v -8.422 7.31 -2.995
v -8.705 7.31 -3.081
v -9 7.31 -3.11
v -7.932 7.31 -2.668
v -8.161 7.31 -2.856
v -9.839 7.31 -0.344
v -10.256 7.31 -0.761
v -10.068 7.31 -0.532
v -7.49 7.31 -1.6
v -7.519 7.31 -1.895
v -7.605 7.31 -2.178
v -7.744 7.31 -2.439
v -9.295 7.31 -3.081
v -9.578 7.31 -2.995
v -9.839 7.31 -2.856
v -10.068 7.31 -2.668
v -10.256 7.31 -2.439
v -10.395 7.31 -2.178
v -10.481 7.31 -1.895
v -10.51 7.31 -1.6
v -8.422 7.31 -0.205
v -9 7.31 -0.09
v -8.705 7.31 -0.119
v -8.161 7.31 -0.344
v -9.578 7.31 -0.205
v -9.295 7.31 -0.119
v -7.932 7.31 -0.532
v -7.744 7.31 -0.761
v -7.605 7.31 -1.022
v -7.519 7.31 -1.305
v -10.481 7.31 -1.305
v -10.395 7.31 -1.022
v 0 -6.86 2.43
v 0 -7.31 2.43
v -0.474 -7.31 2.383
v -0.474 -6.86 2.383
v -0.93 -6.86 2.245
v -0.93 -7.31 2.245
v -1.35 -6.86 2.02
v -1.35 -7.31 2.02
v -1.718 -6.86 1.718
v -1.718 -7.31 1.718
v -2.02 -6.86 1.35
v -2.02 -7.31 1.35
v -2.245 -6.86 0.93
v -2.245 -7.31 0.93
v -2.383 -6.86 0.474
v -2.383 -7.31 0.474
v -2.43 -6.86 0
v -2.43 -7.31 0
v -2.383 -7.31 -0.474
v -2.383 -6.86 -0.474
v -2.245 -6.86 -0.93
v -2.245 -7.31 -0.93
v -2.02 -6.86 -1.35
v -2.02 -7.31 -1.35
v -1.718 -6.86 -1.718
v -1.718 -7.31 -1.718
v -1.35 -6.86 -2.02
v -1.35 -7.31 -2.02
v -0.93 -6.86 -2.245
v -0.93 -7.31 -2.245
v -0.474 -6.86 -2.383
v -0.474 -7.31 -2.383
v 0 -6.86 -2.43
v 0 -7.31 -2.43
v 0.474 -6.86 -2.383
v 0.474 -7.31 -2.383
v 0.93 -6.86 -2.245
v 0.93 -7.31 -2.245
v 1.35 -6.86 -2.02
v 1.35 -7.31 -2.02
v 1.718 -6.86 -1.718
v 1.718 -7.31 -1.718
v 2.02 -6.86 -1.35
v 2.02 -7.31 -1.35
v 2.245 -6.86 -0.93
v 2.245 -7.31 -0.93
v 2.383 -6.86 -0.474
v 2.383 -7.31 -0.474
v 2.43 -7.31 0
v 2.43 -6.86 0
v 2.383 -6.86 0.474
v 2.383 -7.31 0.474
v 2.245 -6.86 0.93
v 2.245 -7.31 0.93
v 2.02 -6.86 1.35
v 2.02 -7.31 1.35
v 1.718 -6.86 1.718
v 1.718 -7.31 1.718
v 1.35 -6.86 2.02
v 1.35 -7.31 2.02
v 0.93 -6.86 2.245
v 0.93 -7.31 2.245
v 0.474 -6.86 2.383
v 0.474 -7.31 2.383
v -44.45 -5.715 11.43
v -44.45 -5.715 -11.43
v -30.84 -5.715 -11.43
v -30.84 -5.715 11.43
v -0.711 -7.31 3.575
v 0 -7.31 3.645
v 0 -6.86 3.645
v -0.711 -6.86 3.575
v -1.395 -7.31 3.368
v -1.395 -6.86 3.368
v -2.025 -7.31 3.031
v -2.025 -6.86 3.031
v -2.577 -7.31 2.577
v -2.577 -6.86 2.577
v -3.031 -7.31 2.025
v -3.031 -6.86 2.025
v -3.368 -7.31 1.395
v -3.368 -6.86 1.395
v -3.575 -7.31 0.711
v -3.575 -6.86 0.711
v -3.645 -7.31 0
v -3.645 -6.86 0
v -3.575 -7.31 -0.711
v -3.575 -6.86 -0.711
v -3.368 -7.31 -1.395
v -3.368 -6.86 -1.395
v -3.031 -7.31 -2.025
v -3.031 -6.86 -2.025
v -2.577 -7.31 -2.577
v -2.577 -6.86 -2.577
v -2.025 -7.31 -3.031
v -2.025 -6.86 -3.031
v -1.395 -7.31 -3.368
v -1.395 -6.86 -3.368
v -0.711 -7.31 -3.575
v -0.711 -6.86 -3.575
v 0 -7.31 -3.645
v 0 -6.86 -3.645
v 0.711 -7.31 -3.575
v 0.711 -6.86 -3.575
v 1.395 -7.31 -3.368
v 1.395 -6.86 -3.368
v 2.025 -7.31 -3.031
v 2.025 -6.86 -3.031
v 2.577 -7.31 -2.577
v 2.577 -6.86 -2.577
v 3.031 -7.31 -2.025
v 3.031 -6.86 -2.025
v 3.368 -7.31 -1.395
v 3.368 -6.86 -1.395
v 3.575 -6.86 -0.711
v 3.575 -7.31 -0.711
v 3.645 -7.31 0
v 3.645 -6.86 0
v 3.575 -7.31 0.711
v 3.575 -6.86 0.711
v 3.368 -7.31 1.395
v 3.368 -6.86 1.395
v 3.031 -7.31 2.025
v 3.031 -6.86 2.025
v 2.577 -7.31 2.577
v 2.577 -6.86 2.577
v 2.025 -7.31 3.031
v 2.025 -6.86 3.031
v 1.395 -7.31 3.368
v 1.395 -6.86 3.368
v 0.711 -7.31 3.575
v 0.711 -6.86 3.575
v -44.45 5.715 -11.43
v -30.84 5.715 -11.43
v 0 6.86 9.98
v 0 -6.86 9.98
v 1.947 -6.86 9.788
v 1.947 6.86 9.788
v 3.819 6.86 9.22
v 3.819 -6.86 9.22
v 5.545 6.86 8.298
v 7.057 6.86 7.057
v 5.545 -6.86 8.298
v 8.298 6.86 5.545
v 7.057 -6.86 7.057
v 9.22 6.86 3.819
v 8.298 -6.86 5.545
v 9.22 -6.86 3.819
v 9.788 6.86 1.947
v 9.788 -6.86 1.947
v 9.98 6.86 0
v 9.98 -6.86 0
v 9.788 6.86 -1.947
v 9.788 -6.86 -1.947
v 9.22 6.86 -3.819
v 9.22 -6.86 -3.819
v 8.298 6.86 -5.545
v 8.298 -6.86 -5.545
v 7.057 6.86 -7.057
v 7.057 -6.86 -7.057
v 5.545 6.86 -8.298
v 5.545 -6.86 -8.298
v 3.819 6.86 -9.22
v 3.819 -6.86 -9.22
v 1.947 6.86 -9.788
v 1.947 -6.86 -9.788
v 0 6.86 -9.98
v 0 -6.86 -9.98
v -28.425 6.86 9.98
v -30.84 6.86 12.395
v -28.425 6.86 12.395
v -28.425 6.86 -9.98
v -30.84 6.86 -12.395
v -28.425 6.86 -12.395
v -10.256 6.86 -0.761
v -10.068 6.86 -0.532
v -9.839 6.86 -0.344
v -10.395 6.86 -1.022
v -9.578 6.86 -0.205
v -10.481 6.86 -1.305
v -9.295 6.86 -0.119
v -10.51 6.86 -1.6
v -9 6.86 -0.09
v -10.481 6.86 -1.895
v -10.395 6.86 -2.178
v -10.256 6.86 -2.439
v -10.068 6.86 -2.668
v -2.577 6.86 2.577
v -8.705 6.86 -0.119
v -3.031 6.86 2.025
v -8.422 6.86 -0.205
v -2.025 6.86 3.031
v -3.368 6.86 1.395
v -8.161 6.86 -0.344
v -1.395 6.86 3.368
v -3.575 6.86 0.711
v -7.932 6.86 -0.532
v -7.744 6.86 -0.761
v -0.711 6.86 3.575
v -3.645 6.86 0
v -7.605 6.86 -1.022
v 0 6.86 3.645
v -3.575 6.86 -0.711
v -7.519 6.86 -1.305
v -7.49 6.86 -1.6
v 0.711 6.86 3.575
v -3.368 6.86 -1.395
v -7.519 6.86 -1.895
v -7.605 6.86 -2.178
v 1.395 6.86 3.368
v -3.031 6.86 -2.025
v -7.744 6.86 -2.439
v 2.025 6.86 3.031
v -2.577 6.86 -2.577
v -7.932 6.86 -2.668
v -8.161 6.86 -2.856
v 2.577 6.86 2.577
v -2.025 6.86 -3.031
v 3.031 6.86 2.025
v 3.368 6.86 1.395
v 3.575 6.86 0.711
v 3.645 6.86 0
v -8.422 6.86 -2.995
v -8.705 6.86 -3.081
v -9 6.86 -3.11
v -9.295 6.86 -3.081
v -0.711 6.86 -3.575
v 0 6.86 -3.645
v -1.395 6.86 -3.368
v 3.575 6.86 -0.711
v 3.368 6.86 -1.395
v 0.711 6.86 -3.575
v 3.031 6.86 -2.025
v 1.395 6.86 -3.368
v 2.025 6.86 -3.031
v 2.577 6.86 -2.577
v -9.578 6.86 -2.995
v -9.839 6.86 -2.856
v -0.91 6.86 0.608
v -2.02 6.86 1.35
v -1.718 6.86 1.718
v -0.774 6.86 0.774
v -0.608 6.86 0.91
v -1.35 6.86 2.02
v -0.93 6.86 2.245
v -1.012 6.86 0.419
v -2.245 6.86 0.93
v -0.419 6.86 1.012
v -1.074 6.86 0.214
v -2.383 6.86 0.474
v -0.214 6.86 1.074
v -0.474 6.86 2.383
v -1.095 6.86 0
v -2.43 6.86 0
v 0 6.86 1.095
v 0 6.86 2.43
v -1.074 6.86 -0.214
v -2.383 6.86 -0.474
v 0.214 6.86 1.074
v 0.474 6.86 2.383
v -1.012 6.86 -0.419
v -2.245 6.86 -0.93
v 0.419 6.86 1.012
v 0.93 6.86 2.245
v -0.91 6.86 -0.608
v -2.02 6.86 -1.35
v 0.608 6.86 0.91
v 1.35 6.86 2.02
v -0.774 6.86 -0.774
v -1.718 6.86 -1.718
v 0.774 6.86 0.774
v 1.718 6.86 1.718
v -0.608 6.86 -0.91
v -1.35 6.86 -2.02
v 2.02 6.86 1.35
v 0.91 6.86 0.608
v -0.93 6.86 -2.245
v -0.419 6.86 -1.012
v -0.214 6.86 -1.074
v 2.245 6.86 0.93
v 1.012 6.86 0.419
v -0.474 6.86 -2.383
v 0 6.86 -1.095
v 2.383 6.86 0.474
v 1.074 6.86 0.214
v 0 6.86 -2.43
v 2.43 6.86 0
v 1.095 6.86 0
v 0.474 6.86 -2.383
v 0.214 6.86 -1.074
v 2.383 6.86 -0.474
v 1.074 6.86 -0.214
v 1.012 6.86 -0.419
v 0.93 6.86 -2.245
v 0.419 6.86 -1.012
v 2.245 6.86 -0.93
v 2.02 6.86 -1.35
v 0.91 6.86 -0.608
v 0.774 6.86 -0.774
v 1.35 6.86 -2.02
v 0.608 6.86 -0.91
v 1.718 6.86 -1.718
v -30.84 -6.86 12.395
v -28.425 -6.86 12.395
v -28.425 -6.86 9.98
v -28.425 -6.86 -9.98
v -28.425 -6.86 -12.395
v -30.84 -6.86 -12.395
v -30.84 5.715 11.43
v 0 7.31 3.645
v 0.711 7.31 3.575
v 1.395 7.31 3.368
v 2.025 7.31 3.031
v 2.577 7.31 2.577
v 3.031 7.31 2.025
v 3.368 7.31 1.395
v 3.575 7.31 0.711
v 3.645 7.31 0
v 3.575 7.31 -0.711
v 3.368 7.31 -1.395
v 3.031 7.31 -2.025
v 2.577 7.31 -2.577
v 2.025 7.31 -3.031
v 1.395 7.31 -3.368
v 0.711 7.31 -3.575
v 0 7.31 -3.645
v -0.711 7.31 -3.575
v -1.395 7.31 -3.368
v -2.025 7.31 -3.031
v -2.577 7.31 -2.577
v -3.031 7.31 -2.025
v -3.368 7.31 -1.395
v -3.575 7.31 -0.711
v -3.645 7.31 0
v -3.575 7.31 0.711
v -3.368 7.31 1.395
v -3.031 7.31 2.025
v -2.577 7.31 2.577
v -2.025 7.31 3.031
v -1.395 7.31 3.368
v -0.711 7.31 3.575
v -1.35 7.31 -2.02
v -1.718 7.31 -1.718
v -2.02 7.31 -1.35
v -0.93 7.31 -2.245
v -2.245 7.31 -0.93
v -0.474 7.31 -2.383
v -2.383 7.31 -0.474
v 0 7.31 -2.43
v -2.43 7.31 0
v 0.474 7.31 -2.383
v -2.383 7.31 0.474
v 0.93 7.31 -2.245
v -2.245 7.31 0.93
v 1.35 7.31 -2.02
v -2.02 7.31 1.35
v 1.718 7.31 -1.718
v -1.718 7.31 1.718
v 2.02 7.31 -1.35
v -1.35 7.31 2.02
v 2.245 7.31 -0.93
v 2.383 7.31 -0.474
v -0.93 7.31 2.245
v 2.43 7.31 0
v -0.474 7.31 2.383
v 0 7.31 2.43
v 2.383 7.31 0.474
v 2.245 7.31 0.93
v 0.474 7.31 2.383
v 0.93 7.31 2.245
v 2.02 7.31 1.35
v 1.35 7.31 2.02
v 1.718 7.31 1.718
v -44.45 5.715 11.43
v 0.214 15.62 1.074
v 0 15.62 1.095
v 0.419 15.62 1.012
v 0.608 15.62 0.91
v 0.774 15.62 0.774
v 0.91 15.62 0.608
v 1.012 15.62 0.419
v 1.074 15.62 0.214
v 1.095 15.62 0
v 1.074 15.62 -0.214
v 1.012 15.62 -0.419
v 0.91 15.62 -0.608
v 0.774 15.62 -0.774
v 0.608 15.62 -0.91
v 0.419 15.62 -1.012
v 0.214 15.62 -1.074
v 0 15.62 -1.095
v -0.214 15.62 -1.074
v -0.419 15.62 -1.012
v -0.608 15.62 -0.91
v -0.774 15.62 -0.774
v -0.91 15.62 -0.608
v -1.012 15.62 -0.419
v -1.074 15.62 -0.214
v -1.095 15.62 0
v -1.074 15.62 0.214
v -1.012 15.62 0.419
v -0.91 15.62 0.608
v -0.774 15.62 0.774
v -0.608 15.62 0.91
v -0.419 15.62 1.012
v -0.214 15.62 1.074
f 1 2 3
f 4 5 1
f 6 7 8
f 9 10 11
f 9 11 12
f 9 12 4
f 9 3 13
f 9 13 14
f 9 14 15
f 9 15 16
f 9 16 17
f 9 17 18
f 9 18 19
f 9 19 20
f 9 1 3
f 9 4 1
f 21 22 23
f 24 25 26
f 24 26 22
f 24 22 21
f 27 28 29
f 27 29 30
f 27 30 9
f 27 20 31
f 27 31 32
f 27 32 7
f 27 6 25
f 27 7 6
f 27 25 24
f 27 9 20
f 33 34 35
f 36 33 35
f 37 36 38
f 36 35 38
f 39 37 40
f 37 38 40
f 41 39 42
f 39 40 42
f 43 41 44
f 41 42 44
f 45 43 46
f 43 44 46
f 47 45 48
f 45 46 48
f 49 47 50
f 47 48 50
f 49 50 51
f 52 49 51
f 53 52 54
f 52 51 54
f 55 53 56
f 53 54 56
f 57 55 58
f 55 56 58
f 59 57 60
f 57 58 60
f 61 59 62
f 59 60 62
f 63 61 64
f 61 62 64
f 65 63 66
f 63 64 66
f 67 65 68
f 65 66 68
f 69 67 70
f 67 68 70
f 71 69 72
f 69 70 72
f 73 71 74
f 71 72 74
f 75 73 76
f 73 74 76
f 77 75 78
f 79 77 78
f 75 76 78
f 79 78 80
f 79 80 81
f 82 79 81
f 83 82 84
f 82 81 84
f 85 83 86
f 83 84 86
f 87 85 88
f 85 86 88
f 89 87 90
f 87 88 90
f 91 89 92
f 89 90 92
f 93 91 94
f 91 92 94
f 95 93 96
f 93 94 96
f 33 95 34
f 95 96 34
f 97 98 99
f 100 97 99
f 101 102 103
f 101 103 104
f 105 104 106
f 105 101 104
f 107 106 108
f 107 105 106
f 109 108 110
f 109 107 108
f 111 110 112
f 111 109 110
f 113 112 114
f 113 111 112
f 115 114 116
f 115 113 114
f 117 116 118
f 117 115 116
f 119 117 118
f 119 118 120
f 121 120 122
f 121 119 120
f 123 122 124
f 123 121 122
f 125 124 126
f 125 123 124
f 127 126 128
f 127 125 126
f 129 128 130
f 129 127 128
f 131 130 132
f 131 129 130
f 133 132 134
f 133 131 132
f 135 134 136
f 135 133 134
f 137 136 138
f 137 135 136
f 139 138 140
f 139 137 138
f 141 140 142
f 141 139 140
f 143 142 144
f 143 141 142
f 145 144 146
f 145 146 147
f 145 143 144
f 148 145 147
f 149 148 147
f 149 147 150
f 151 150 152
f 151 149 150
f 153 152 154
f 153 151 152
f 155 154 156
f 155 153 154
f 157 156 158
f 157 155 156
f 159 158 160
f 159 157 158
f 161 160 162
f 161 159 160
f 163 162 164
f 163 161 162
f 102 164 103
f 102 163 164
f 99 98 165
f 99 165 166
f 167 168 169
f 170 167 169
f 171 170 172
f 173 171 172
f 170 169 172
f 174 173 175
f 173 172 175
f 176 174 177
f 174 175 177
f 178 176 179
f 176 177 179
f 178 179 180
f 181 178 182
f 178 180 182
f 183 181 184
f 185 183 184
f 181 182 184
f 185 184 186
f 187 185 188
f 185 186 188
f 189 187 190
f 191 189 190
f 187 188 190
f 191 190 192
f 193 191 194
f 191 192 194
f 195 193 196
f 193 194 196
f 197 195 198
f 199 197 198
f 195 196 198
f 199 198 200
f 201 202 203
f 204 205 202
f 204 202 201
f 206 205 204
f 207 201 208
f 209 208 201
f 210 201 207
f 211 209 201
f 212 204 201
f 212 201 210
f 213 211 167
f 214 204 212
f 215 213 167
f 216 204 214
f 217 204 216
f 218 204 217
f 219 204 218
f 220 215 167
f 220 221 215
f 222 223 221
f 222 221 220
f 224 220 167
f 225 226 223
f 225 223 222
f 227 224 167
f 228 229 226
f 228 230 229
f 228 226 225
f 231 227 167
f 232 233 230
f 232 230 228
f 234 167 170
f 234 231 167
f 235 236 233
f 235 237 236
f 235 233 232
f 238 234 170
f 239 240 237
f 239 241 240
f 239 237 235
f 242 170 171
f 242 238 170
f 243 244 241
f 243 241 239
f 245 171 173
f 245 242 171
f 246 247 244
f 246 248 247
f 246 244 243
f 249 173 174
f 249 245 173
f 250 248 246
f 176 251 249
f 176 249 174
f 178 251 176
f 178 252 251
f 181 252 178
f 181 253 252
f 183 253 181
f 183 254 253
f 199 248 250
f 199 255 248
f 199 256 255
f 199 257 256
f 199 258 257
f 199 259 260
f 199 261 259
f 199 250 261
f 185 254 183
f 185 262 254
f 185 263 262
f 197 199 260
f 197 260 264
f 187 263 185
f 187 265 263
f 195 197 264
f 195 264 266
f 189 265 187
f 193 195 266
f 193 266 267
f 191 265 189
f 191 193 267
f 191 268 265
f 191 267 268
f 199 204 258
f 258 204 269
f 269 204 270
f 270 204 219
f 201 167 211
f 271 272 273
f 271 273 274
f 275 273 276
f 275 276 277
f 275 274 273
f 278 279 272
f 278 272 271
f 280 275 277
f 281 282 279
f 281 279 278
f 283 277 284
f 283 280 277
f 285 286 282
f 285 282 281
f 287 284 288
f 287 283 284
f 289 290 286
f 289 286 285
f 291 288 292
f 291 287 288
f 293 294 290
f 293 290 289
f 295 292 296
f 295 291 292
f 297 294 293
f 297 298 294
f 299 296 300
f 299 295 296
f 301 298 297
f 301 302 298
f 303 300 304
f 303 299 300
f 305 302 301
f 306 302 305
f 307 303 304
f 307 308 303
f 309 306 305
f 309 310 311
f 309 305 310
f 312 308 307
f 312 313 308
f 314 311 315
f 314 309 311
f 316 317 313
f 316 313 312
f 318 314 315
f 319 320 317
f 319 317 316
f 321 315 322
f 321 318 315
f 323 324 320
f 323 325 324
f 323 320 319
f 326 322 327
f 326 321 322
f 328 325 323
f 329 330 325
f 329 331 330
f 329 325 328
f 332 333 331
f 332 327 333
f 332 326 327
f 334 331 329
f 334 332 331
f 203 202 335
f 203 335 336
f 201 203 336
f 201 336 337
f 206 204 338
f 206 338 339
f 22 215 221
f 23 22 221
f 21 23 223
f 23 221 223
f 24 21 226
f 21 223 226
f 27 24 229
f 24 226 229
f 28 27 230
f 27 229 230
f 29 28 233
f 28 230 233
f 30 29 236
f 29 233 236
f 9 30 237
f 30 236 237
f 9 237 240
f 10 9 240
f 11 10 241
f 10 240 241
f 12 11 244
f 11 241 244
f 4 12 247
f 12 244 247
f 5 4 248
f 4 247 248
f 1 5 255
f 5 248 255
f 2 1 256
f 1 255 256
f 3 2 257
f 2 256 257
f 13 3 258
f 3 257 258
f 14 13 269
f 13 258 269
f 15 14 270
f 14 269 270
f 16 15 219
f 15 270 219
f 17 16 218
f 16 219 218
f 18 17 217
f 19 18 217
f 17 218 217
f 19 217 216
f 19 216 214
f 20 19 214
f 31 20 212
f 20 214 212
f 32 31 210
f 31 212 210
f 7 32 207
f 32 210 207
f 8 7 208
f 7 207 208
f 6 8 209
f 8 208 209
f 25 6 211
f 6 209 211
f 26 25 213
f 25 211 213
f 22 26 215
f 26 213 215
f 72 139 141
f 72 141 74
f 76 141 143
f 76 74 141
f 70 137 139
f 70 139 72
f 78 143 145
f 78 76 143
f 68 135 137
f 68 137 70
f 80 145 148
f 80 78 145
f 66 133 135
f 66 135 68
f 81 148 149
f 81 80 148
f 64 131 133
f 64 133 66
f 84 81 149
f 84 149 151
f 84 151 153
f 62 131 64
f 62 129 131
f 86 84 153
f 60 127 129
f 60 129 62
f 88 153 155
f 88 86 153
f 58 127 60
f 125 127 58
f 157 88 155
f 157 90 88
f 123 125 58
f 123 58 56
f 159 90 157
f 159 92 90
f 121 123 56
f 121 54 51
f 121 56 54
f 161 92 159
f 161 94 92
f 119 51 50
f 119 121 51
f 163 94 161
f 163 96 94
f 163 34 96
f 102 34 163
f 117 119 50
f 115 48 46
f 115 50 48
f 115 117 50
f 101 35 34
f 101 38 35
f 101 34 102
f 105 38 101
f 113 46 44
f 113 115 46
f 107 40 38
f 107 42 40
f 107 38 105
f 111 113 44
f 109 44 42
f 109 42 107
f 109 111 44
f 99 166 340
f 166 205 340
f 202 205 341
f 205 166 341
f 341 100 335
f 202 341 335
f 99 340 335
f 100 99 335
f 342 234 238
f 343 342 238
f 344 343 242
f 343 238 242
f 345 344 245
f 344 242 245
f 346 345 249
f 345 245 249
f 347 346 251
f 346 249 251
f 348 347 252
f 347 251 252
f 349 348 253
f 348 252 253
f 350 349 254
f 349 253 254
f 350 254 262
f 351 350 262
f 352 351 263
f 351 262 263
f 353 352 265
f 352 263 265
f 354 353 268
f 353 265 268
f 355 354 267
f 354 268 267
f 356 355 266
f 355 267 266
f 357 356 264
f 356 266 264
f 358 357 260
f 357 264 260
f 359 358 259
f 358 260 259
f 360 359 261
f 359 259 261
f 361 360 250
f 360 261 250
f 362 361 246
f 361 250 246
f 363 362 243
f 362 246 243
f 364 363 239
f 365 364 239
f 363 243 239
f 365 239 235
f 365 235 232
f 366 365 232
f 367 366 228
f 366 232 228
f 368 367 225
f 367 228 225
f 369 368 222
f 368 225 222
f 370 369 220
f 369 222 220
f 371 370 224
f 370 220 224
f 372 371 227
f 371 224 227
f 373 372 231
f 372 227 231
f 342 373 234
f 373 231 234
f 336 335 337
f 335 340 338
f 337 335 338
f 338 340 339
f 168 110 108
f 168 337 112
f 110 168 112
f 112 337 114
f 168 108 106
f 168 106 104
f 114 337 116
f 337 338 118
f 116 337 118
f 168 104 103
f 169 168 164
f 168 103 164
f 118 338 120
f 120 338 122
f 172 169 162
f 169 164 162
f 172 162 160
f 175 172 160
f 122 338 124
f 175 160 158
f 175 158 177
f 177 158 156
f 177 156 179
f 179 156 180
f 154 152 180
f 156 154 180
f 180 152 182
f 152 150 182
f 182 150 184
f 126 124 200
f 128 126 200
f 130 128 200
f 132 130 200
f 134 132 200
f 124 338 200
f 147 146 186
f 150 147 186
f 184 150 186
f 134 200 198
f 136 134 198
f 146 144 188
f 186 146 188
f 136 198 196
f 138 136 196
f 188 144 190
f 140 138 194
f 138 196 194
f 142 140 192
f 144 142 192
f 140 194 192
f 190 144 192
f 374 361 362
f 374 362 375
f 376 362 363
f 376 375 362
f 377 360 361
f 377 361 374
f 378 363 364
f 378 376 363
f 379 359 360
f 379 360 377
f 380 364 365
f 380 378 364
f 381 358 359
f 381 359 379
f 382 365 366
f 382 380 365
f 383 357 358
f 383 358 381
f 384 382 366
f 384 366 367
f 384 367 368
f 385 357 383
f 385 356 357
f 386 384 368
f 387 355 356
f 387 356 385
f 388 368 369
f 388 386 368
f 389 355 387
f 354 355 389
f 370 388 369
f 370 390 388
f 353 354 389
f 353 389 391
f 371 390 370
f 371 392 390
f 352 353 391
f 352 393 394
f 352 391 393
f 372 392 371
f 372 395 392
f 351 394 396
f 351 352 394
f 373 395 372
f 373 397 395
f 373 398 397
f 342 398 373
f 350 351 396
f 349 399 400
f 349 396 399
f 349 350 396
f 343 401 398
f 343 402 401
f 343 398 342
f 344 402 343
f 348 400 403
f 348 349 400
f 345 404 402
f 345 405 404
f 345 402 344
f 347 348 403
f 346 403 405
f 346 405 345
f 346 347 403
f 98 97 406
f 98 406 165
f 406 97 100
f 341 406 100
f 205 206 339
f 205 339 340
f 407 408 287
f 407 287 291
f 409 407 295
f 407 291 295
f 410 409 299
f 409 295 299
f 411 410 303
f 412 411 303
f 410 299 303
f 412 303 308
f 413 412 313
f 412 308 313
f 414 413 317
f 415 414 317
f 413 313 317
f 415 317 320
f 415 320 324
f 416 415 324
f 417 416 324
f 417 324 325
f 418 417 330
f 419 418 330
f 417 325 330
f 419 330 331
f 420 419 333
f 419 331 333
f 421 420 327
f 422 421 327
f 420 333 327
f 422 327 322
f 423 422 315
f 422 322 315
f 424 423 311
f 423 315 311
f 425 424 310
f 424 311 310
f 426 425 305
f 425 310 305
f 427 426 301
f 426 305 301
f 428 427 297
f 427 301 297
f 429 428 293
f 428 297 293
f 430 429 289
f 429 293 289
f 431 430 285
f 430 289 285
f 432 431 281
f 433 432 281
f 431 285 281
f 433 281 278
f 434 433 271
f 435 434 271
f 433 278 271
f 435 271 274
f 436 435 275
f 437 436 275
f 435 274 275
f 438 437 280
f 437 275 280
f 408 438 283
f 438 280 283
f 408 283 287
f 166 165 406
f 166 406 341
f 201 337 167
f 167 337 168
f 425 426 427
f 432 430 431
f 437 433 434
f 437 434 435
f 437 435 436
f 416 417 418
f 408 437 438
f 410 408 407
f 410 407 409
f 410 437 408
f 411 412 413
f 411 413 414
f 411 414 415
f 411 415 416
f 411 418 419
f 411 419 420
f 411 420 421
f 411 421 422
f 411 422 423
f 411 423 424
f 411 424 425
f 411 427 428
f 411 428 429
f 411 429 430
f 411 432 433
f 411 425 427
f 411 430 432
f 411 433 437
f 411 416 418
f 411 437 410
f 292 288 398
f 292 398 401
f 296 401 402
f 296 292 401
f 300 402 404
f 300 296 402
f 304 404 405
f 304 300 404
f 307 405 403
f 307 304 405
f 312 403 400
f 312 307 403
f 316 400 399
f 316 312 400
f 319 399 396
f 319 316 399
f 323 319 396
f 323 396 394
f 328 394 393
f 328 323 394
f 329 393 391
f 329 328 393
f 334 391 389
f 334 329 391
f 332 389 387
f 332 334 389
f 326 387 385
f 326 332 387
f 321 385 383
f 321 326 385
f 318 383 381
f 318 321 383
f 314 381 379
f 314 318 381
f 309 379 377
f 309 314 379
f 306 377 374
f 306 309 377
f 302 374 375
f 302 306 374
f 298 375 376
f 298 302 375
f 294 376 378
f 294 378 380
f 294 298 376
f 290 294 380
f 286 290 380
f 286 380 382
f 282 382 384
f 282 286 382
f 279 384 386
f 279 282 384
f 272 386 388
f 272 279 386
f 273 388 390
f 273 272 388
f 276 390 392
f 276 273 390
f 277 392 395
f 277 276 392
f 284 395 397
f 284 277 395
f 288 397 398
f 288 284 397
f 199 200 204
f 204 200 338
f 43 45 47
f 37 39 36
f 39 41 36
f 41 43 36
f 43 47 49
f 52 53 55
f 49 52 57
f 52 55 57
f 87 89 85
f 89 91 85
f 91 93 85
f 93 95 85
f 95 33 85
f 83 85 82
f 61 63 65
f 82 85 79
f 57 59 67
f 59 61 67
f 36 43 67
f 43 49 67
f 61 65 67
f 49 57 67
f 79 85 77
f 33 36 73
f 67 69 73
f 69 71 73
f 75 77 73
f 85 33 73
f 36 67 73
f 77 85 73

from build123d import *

# Parameters (mm, degrees)
GEAR_BOX_DEPTH      = 6.86
GEAR_BOX_DEPTH_BACK = 6.86
MOTOR_DEPTH         = 5.715
MOTOR_DEPTH_BACK    = 5.715
SKETCH2_W           = 13.61
SKETCH2_H           = 22.86
SKETCH3_R           = 1.51
SKETCH3_R_2         = 3.645
SKETCH3_R_3         = 2.43
SPACER_DEPTH        = 0.45
SPACER_BACK_START   = 0.45
SKETCH5_R           = 3.645
SKETCH5_R_2         = 2.43
SPACER_BACK_DEPTH   = 0.45
SKETCH4_R           = 1.095
OUTPUT_SHAFT_DEPTH  = 8.76


with BuildPart() as part:
    # Sketch1 → Gear Box (new, two sides: drawn at the far end of the back side and taken through both)
    with BuildSketch(Plane(origin=(0, 0, 0), x_dir=(1, 0, 0), z_dir=(0, 1, 0)).offset(-GEAR_BOX_DEPTH_BACK)):
        with BuildLine():
            Line((0, 9.98), (-28.425, 9.98))
            Line((-28.425, 9.98), (-28.425, 12.395))
            Line((-28.425, 12.395), (-30.84, 12.395))
            Line((-30.84, 12.395), (-30.84, -12.395))
            Line((-30.84, -12.395), (-28.425, -12.395))
            Line((-28.425, -12.395), (-28.425, -9.98))
            Line((-28.425, -9.98), (0, -9.98))
            ThreePointArc((0, -9.98), (9.98, 0), (0, 9.98))
        make_face()
    extrude(amount=GEAR_BOX_DEPTH + GEAR_BOX_DEPTH_BACK)

    # Sketch2 → Motor (add, two sides: drawn at the far end of the back side and taken through both)
    with BuildSketch(Plane(origin=(0, 0, 0), x_dir=(1, 0, 0), z_dir=(0, 1, 0)).offset(-MOTOR_DEPTH_BACK)):
        with Locations((-37.645, 0)):
            Rectangle(SKETCH2_W, SKETCH2_H)
    extrude(amount=MOTOR_DEPTH + MOTOR_DEPTH_BACK)

    # Sketch3 → Spacer (add)
    # profile 1 of 2: a face of its own
    with BuildSketch(Plane(origin=(0, 6.86, 0), x_dir=(1, 0, 0), z_dir=(0, 1, 0))):
        with Locations(Location((-9, 1.6, 0), (0, 0, 270))):
            Circle(SKETCH3_R)
    # profile 2 of 2: a face of its own
    with BuildSketch(Plane(origin=(0, 6.86, 0), x_dir=(1, 0, 0), z_dir=(0, 1, 0))):
        with Locations(Location((0, 0, 0), (0, 0, 270))):
            Circle(SKETCH3_R_2)
        with Locations(Location((0, 0, 0), (0, 0, 270))):
            Circle(SKETCH3_R_3, mode=Mode.SUBTRACT)
    extrude(amount=SPACER_DEPTH)

    # Sketch5 → Spacer(back) (add)
    with BuildSketch(Plane.XZ.offset(6.86).offset(SPACER_BACK_START)):
        with Locations(Location((0, 0, 0), (0, 0, 90))):
            Circle(SKETCH5_R)
        with Locations(Location((0, 0, 0), (0, 0, 90))):
            Circle(SKETCH5_R_2, mode=Mode.SUBTRACT)
    extrude(amount=-SPACER_BACK_DEPTH)

    # Sketch4 → Output Shaft (add)
    with BuildSketch(Plane(origin=(0, 6.86, 0), x_dir=(1, 0, 0), z_dir=(0, 1, 0))):
        with Locations(Location((0, 0, 0), (0, 0, 270))):
            Circle(SKETCH4_R)
    extrude(amount=OUTPUT_SHAFT_DEPTH)


solid = part.part
